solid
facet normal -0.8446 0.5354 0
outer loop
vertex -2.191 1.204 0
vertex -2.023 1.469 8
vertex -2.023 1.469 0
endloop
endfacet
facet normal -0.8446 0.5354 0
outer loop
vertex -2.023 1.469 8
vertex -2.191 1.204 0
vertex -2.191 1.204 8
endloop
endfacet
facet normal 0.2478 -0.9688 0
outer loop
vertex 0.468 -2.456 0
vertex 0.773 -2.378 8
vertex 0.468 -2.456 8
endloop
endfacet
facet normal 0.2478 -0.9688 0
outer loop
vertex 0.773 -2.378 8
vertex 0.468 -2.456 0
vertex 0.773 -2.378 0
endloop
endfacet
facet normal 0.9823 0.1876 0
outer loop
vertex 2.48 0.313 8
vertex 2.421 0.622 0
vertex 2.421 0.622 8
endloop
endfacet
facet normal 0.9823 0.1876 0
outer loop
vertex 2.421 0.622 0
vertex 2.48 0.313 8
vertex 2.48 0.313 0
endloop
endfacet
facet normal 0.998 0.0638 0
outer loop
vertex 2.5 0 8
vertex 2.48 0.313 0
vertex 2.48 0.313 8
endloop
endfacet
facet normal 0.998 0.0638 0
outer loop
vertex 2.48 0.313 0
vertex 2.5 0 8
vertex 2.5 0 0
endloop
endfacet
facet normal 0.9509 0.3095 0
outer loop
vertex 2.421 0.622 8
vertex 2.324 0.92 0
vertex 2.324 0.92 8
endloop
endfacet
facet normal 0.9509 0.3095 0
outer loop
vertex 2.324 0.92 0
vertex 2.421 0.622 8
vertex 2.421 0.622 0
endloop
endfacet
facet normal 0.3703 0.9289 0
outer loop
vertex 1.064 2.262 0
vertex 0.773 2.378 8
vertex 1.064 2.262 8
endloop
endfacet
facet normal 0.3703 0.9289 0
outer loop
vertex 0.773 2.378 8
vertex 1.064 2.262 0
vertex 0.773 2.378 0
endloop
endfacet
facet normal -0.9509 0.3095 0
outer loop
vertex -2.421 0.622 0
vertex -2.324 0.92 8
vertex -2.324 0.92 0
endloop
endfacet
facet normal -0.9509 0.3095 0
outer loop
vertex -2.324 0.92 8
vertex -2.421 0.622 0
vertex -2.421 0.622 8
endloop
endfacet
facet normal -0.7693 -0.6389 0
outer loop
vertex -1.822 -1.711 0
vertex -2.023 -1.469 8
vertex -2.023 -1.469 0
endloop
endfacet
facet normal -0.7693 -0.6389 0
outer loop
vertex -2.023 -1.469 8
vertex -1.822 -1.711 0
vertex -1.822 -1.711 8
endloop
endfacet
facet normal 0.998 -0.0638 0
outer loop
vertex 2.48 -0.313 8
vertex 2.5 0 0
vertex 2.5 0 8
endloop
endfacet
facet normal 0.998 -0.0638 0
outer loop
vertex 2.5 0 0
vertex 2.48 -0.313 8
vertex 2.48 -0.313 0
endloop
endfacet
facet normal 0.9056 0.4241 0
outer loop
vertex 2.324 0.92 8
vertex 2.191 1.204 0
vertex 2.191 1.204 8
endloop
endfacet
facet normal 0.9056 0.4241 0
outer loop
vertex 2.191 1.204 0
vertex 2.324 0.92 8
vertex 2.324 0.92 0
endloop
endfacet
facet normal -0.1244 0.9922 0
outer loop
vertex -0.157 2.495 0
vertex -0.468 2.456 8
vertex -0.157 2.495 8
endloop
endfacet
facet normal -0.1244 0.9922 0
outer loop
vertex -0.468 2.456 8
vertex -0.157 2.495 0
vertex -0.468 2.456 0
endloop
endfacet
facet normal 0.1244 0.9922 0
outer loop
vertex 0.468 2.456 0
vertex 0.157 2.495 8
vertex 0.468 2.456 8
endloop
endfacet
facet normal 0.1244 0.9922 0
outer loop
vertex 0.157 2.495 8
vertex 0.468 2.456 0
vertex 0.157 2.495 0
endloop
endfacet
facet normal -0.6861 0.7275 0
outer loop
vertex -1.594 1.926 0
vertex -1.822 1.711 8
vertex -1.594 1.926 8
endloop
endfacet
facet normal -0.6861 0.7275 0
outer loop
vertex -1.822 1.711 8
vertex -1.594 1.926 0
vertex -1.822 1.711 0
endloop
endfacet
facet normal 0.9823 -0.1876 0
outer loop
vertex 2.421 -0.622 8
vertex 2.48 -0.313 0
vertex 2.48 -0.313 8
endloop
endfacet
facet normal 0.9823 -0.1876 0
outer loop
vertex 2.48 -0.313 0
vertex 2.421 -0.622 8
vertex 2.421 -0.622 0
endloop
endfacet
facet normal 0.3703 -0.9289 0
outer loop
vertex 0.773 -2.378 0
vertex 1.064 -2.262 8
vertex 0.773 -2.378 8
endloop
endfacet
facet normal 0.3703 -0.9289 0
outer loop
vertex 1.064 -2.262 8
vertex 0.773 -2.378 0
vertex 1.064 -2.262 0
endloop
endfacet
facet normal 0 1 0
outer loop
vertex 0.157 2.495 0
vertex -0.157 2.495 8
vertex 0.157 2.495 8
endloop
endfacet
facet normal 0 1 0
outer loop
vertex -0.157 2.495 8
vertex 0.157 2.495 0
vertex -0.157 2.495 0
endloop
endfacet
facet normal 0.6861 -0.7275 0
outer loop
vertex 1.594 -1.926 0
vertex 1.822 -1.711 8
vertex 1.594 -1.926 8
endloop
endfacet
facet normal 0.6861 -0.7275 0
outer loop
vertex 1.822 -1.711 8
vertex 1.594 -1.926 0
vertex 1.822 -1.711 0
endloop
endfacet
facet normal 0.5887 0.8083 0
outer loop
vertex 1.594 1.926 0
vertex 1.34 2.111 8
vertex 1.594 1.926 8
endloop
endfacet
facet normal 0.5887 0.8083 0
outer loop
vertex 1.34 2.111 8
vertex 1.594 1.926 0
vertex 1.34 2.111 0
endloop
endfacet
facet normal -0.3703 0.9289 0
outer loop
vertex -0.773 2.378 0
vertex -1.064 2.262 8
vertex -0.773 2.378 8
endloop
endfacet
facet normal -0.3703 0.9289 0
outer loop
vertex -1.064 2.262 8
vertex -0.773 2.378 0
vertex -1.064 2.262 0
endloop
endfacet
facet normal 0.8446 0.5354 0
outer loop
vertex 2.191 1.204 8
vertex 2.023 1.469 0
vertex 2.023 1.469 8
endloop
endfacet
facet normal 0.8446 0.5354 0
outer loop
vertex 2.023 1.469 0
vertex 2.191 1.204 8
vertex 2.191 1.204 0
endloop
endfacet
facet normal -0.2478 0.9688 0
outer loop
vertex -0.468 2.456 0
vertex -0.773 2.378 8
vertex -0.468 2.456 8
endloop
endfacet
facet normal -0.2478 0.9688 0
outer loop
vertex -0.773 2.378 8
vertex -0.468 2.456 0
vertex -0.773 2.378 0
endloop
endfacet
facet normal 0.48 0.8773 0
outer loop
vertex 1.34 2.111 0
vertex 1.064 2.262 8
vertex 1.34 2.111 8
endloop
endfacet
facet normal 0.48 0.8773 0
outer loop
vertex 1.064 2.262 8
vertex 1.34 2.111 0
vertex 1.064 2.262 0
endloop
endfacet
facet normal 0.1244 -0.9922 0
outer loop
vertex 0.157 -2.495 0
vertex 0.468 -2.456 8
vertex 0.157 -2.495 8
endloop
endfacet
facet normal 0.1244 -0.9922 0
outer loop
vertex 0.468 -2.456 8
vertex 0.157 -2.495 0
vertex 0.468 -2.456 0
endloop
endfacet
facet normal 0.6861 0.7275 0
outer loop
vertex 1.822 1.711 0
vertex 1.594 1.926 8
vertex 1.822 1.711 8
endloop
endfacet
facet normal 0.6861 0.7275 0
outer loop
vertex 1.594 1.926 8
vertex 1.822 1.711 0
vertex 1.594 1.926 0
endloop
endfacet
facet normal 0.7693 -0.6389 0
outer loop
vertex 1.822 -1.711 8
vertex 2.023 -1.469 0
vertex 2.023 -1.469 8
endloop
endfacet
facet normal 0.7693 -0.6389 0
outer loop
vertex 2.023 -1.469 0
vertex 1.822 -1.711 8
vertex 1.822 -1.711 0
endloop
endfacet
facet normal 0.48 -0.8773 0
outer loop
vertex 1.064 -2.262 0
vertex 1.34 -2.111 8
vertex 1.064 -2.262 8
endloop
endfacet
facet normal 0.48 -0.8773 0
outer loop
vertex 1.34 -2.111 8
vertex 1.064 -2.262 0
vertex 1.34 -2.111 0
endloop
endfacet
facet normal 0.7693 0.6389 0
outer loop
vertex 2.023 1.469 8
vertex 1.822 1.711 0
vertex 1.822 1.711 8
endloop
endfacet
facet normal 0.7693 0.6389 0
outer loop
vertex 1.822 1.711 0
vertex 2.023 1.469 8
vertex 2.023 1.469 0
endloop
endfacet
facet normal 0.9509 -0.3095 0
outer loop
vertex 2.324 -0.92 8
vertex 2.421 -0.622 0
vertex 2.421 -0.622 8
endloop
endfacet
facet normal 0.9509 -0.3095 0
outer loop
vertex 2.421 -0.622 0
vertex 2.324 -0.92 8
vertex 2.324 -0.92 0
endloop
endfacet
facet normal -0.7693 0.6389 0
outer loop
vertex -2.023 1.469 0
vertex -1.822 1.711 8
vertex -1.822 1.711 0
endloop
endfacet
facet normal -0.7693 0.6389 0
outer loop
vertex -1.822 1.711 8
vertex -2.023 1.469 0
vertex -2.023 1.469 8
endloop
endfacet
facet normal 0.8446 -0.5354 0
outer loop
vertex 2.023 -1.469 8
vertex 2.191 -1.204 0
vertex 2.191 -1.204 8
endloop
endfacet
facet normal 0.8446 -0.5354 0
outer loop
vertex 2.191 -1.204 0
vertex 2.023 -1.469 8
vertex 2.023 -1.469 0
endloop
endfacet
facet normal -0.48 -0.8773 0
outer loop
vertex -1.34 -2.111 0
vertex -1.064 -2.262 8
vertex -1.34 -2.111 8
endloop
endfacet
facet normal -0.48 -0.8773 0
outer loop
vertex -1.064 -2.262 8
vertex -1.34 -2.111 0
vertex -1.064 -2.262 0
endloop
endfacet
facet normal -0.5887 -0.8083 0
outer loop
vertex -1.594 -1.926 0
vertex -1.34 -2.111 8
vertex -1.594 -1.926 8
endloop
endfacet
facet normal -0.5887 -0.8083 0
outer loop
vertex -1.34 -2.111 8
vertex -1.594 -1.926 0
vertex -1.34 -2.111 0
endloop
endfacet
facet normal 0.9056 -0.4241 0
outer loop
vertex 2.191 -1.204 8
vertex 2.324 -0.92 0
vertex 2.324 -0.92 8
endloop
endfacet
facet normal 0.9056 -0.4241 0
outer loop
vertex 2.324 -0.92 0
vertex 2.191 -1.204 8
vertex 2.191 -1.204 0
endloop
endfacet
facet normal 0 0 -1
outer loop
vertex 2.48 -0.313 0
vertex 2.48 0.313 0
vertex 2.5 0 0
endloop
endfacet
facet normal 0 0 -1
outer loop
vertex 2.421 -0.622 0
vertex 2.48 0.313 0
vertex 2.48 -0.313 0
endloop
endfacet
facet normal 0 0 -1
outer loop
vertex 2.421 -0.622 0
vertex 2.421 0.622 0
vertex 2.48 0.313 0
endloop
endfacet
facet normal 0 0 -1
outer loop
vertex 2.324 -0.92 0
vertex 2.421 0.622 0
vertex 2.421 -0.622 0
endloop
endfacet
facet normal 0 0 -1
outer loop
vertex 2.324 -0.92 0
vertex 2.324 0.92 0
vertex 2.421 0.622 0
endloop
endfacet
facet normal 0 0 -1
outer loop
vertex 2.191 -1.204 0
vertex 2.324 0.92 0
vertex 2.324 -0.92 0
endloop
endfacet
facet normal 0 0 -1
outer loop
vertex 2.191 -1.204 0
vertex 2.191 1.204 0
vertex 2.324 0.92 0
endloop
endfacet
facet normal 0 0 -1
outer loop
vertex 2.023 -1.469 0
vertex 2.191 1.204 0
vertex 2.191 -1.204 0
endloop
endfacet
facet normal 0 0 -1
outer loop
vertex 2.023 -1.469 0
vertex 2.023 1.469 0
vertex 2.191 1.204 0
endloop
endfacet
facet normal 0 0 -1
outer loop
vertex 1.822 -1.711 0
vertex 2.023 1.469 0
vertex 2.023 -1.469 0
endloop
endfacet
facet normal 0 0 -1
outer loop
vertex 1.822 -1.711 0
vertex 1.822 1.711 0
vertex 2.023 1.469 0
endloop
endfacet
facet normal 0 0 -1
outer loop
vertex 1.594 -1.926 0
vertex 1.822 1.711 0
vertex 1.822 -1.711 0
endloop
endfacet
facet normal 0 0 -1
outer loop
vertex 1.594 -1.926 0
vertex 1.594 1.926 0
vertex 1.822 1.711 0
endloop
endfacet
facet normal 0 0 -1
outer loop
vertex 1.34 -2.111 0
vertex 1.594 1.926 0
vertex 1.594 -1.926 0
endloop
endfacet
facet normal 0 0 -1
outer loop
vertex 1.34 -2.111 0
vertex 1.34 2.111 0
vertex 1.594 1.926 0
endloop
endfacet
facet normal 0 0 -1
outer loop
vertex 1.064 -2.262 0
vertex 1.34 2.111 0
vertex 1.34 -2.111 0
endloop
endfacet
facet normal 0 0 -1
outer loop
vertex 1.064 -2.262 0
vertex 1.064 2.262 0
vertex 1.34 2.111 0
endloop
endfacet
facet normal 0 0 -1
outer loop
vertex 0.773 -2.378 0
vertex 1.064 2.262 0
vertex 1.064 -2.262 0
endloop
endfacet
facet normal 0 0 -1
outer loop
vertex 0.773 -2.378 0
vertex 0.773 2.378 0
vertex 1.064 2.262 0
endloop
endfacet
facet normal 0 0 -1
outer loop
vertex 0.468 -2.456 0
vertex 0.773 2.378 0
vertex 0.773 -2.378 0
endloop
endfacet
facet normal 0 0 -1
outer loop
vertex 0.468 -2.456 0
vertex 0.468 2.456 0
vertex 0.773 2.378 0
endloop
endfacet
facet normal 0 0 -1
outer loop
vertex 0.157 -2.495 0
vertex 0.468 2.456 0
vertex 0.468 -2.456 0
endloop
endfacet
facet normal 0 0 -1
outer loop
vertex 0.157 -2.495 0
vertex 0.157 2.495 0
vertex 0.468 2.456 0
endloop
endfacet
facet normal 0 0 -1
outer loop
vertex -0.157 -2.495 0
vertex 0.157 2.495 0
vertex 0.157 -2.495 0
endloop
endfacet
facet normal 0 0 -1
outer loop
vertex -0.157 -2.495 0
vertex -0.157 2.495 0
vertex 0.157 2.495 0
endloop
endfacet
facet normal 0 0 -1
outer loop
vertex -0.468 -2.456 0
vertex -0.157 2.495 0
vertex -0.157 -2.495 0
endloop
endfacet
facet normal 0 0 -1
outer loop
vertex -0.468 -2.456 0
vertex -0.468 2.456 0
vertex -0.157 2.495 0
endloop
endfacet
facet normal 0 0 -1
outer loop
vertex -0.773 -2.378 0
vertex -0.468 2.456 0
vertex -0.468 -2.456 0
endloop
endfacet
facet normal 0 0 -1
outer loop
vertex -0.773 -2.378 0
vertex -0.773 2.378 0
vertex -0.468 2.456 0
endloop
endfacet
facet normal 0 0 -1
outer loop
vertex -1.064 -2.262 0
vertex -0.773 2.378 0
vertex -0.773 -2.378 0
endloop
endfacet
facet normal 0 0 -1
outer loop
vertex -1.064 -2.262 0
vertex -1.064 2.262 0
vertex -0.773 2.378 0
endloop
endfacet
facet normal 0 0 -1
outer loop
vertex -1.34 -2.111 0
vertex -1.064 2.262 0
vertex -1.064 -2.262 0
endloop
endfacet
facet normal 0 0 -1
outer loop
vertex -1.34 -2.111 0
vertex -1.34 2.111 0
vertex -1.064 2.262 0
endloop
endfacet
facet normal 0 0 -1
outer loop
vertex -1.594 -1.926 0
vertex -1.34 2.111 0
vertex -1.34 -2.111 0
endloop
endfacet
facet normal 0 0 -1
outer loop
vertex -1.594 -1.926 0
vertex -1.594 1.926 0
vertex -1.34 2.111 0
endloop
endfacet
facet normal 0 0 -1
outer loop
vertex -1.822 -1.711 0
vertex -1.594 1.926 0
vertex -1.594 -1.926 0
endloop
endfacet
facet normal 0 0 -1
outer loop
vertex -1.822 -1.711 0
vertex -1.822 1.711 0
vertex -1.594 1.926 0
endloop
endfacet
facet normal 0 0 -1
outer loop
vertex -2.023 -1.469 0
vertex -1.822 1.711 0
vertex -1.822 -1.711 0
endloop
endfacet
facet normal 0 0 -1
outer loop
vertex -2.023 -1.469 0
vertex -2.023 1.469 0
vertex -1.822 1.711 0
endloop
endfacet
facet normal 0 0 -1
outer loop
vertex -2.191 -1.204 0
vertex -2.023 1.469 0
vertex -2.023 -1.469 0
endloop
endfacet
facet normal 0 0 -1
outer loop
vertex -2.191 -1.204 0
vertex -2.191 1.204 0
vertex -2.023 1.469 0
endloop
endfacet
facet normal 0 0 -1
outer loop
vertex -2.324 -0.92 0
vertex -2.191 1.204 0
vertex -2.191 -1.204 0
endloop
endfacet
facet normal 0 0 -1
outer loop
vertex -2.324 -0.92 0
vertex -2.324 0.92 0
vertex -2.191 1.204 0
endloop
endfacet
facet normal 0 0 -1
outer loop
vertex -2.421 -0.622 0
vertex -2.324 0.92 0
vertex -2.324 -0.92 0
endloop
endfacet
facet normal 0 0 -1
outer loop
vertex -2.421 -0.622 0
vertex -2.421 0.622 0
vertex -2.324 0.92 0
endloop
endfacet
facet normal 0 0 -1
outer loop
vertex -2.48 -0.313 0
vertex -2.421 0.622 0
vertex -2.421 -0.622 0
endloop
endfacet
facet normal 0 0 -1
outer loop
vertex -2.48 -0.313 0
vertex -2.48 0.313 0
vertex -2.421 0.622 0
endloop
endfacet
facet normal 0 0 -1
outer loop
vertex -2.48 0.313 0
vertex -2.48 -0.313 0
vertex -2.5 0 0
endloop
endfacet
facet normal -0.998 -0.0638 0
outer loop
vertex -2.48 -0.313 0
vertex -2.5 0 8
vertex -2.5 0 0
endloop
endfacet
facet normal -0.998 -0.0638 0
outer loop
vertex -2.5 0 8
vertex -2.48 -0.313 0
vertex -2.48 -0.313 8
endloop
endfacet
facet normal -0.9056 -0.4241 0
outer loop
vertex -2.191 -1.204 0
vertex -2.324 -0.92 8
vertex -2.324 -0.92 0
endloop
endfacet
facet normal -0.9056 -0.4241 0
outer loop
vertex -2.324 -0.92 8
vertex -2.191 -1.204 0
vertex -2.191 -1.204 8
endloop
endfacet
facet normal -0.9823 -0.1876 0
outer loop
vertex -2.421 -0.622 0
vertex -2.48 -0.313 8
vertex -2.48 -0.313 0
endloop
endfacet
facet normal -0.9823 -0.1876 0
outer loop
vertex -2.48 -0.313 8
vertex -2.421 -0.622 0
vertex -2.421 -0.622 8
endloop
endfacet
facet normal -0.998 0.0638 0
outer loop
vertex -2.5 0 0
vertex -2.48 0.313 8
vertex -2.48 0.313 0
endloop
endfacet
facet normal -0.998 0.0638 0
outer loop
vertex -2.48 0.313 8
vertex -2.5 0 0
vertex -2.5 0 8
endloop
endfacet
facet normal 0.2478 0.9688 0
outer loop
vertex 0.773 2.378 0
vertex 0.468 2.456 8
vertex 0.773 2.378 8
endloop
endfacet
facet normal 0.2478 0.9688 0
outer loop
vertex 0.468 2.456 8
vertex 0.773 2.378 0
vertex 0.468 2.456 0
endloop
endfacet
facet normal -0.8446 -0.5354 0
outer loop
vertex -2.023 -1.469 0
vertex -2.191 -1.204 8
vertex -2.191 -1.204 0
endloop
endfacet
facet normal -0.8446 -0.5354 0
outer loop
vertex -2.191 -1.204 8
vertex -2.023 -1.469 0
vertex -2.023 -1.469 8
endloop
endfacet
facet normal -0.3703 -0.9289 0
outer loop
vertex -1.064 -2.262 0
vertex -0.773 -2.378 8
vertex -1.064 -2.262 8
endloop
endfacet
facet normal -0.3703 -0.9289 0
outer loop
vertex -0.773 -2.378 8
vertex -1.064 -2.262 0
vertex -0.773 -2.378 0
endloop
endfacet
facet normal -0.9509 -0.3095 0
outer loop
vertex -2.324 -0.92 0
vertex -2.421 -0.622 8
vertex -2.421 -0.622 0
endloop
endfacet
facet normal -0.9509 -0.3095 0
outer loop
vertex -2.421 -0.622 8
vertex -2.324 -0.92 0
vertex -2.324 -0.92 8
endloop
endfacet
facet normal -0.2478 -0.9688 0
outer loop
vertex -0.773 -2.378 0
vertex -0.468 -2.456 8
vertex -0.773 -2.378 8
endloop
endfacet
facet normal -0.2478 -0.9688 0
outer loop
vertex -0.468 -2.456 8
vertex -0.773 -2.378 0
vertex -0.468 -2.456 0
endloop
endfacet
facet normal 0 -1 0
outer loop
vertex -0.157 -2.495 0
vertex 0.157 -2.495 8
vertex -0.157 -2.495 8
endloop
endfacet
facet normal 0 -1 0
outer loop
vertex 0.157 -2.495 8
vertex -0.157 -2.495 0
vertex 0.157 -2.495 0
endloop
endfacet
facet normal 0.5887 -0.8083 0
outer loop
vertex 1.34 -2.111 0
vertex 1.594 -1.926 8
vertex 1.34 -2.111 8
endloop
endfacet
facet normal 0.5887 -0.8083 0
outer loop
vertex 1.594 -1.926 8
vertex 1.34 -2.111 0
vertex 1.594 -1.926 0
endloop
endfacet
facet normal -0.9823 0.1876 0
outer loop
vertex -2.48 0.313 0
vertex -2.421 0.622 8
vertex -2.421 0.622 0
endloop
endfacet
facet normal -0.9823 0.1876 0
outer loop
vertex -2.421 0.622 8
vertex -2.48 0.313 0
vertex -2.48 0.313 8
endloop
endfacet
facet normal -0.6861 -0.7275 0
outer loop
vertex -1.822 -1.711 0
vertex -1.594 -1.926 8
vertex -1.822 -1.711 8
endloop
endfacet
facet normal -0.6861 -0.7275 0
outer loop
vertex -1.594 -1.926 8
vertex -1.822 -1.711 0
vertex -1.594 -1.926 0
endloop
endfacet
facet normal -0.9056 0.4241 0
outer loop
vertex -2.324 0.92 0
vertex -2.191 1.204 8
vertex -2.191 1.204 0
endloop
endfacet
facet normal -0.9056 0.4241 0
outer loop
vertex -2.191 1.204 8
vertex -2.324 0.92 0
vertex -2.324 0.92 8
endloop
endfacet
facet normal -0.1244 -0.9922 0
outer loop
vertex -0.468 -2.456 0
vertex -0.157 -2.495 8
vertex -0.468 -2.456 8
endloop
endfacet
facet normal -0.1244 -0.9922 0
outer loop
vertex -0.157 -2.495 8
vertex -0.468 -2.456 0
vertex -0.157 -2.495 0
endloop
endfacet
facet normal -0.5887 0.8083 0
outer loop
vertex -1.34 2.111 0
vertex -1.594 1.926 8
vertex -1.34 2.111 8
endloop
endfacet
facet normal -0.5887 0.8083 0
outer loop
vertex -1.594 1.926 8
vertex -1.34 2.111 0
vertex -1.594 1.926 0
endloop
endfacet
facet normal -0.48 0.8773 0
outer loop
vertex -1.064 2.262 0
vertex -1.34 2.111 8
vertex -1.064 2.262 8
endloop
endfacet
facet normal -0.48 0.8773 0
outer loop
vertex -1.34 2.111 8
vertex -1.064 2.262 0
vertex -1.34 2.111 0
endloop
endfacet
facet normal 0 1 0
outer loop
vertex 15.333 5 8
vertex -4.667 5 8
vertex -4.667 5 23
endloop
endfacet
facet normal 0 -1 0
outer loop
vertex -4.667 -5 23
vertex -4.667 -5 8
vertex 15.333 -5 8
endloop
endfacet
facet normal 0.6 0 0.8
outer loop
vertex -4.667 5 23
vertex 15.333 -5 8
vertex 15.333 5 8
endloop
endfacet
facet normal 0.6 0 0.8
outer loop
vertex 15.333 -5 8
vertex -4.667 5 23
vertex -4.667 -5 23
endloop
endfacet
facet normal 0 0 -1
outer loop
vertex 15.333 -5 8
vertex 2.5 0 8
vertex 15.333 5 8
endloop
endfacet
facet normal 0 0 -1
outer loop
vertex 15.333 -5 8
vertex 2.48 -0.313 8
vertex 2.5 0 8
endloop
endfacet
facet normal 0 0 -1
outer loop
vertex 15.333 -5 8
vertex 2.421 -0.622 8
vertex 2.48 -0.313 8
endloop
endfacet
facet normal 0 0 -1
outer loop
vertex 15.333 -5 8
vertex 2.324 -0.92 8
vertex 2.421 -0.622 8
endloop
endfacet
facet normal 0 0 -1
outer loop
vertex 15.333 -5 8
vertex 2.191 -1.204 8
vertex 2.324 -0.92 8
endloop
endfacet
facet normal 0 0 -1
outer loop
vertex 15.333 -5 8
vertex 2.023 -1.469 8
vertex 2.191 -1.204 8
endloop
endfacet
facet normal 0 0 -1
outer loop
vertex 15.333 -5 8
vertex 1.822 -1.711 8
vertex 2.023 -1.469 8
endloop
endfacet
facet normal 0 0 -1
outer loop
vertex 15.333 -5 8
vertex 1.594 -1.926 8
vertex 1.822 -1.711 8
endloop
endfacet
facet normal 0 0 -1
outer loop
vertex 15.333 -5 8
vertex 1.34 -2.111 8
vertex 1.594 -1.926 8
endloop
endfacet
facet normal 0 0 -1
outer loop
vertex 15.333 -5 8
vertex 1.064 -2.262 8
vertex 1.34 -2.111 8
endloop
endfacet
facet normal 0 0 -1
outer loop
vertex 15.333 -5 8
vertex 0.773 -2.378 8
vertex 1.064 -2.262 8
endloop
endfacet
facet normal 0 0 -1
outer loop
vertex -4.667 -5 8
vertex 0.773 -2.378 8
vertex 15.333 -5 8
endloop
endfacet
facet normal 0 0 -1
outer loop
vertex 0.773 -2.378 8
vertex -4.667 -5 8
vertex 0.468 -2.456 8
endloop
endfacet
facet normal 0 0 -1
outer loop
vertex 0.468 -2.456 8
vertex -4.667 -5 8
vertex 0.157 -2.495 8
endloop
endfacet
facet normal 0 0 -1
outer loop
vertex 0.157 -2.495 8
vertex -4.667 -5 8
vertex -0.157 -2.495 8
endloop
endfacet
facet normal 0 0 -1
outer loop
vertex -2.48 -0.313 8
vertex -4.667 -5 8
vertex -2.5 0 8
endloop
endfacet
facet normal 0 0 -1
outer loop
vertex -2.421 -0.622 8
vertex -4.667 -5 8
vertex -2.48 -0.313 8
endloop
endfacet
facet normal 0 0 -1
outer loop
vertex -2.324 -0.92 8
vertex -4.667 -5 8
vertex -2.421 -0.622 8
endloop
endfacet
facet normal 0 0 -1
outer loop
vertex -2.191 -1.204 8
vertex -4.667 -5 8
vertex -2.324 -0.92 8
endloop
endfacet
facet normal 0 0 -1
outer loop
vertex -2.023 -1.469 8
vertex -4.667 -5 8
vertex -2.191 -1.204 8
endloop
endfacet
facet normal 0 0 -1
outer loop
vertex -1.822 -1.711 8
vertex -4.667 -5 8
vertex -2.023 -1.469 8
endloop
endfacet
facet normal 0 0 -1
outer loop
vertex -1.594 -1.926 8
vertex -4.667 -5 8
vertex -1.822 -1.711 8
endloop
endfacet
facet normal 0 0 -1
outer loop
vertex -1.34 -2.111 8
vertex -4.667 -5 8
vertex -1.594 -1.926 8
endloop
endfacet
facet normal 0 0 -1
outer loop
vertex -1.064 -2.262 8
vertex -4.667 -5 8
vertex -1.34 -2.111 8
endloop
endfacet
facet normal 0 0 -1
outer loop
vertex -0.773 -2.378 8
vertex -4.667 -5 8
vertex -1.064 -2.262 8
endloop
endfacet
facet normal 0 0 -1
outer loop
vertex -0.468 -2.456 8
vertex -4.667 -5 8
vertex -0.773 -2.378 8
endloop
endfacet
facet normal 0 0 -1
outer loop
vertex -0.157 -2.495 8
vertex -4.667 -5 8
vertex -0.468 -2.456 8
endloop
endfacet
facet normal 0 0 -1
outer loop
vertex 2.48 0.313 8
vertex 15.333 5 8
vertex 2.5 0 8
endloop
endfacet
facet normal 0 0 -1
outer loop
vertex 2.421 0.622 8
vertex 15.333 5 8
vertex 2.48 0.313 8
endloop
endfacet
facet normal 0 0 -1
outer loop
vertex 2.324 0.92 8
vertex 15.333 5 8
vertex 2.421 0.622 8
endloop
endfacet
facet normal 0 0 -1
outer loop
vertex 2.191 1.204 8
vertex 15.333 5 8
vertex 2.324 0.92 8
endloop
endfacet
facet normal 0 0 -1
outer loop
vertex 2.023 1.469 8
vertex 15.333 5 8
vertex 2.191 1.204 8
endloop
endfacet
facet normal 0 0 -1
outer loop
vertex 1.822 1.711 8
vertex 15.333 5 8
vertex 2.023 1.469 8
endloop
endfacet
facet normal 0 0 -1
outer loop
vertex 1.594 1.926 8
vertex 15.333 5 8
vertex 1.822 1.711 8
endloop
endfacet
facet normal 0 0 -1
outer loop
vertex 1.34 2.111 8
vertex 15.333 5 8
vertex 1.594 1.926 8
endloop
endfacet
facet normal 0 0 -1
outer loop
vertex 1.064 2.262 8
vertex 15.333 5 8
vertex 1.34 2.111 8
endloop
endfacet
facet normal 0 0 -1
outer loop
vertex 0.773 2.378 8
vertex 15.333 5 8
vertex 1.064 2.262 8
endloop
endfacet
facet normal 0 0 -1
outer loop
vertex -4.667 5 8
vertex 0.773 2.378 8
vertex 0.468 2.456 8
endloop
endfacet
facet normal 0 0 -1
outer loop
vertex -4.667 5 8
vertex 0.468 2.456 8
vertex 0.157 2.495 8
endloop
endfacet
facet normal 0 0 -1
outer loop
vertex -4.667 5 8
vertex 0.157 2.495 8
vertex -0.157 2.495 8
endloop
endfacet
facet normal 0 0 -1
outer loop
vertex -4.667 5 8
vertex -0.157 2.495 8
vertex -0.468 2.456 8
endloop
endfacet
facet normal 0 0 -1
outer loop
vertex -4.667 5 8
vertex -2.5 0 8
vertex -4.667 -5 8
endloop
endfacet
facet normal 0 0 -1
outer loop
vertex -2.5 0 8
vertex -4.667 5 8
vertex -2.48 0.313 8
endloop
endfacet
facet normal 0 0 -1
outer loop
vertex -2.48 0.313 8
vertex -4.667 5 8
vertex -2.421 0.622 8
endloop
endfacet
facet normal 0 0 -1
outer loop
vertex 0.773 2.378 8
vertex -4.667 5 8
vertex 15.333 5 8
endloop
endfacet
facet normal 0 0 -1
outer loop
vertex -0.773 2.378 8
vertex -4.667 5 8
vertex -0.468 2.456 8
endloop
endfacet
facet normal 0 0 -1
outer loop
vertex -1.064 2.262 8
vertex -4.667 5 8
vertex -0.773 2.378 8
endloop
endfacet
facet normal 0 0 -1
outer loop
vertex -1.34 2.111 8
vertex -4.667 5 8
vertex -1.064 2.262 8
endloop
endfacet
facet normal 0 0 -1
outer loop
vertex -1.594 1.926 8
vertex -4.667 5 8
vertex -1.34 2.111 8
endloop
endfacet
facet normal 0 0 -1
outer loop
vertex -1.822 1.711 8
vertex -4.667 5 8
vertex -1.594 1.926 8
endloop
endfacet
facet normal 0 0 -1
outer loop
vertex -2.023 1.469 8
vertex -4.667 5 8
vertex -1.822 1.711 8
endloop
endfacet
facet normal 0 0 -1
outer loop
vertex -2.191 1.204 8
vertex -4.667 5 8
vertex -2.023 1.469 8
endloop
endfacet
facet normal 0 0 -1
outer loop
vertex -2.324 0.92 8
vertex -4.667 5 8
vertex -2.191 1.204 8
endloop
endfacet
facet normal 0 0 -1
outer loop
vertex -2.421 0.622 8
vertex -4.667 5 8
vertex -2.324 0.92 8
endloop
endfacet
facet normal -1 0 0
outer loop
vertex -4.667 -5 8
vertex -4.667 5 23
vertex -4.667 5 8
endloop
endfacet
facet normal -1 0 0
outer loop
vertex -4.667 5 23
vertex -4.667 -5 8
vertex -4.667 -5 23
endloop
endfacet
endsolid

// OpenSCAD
raggio = 2.5;
altezza_cilindro = 10;
pronfondita = 15;

module triangle(o_len, a_len, depth, center=false)
{
    centroid = center ? [-a_len / 3, -o_len / 3, -depth / 2] : [0, 0, 0];
    translate(centroid) linear_extrude(height=depth)
    {
        polygon(points=[[0, 0],[a_len, 0],[0, o_len]], paths=[[0, 1, 2]]);
    }
}

cylinder(r = raggio, h = altezza_cilindro, center = false, $fn = 50);
translate([2, 0, altezza_cilindro + 3]) rotate(a = 90, v = [1, 0, 0]) triangle(15, 20, 10, true);
